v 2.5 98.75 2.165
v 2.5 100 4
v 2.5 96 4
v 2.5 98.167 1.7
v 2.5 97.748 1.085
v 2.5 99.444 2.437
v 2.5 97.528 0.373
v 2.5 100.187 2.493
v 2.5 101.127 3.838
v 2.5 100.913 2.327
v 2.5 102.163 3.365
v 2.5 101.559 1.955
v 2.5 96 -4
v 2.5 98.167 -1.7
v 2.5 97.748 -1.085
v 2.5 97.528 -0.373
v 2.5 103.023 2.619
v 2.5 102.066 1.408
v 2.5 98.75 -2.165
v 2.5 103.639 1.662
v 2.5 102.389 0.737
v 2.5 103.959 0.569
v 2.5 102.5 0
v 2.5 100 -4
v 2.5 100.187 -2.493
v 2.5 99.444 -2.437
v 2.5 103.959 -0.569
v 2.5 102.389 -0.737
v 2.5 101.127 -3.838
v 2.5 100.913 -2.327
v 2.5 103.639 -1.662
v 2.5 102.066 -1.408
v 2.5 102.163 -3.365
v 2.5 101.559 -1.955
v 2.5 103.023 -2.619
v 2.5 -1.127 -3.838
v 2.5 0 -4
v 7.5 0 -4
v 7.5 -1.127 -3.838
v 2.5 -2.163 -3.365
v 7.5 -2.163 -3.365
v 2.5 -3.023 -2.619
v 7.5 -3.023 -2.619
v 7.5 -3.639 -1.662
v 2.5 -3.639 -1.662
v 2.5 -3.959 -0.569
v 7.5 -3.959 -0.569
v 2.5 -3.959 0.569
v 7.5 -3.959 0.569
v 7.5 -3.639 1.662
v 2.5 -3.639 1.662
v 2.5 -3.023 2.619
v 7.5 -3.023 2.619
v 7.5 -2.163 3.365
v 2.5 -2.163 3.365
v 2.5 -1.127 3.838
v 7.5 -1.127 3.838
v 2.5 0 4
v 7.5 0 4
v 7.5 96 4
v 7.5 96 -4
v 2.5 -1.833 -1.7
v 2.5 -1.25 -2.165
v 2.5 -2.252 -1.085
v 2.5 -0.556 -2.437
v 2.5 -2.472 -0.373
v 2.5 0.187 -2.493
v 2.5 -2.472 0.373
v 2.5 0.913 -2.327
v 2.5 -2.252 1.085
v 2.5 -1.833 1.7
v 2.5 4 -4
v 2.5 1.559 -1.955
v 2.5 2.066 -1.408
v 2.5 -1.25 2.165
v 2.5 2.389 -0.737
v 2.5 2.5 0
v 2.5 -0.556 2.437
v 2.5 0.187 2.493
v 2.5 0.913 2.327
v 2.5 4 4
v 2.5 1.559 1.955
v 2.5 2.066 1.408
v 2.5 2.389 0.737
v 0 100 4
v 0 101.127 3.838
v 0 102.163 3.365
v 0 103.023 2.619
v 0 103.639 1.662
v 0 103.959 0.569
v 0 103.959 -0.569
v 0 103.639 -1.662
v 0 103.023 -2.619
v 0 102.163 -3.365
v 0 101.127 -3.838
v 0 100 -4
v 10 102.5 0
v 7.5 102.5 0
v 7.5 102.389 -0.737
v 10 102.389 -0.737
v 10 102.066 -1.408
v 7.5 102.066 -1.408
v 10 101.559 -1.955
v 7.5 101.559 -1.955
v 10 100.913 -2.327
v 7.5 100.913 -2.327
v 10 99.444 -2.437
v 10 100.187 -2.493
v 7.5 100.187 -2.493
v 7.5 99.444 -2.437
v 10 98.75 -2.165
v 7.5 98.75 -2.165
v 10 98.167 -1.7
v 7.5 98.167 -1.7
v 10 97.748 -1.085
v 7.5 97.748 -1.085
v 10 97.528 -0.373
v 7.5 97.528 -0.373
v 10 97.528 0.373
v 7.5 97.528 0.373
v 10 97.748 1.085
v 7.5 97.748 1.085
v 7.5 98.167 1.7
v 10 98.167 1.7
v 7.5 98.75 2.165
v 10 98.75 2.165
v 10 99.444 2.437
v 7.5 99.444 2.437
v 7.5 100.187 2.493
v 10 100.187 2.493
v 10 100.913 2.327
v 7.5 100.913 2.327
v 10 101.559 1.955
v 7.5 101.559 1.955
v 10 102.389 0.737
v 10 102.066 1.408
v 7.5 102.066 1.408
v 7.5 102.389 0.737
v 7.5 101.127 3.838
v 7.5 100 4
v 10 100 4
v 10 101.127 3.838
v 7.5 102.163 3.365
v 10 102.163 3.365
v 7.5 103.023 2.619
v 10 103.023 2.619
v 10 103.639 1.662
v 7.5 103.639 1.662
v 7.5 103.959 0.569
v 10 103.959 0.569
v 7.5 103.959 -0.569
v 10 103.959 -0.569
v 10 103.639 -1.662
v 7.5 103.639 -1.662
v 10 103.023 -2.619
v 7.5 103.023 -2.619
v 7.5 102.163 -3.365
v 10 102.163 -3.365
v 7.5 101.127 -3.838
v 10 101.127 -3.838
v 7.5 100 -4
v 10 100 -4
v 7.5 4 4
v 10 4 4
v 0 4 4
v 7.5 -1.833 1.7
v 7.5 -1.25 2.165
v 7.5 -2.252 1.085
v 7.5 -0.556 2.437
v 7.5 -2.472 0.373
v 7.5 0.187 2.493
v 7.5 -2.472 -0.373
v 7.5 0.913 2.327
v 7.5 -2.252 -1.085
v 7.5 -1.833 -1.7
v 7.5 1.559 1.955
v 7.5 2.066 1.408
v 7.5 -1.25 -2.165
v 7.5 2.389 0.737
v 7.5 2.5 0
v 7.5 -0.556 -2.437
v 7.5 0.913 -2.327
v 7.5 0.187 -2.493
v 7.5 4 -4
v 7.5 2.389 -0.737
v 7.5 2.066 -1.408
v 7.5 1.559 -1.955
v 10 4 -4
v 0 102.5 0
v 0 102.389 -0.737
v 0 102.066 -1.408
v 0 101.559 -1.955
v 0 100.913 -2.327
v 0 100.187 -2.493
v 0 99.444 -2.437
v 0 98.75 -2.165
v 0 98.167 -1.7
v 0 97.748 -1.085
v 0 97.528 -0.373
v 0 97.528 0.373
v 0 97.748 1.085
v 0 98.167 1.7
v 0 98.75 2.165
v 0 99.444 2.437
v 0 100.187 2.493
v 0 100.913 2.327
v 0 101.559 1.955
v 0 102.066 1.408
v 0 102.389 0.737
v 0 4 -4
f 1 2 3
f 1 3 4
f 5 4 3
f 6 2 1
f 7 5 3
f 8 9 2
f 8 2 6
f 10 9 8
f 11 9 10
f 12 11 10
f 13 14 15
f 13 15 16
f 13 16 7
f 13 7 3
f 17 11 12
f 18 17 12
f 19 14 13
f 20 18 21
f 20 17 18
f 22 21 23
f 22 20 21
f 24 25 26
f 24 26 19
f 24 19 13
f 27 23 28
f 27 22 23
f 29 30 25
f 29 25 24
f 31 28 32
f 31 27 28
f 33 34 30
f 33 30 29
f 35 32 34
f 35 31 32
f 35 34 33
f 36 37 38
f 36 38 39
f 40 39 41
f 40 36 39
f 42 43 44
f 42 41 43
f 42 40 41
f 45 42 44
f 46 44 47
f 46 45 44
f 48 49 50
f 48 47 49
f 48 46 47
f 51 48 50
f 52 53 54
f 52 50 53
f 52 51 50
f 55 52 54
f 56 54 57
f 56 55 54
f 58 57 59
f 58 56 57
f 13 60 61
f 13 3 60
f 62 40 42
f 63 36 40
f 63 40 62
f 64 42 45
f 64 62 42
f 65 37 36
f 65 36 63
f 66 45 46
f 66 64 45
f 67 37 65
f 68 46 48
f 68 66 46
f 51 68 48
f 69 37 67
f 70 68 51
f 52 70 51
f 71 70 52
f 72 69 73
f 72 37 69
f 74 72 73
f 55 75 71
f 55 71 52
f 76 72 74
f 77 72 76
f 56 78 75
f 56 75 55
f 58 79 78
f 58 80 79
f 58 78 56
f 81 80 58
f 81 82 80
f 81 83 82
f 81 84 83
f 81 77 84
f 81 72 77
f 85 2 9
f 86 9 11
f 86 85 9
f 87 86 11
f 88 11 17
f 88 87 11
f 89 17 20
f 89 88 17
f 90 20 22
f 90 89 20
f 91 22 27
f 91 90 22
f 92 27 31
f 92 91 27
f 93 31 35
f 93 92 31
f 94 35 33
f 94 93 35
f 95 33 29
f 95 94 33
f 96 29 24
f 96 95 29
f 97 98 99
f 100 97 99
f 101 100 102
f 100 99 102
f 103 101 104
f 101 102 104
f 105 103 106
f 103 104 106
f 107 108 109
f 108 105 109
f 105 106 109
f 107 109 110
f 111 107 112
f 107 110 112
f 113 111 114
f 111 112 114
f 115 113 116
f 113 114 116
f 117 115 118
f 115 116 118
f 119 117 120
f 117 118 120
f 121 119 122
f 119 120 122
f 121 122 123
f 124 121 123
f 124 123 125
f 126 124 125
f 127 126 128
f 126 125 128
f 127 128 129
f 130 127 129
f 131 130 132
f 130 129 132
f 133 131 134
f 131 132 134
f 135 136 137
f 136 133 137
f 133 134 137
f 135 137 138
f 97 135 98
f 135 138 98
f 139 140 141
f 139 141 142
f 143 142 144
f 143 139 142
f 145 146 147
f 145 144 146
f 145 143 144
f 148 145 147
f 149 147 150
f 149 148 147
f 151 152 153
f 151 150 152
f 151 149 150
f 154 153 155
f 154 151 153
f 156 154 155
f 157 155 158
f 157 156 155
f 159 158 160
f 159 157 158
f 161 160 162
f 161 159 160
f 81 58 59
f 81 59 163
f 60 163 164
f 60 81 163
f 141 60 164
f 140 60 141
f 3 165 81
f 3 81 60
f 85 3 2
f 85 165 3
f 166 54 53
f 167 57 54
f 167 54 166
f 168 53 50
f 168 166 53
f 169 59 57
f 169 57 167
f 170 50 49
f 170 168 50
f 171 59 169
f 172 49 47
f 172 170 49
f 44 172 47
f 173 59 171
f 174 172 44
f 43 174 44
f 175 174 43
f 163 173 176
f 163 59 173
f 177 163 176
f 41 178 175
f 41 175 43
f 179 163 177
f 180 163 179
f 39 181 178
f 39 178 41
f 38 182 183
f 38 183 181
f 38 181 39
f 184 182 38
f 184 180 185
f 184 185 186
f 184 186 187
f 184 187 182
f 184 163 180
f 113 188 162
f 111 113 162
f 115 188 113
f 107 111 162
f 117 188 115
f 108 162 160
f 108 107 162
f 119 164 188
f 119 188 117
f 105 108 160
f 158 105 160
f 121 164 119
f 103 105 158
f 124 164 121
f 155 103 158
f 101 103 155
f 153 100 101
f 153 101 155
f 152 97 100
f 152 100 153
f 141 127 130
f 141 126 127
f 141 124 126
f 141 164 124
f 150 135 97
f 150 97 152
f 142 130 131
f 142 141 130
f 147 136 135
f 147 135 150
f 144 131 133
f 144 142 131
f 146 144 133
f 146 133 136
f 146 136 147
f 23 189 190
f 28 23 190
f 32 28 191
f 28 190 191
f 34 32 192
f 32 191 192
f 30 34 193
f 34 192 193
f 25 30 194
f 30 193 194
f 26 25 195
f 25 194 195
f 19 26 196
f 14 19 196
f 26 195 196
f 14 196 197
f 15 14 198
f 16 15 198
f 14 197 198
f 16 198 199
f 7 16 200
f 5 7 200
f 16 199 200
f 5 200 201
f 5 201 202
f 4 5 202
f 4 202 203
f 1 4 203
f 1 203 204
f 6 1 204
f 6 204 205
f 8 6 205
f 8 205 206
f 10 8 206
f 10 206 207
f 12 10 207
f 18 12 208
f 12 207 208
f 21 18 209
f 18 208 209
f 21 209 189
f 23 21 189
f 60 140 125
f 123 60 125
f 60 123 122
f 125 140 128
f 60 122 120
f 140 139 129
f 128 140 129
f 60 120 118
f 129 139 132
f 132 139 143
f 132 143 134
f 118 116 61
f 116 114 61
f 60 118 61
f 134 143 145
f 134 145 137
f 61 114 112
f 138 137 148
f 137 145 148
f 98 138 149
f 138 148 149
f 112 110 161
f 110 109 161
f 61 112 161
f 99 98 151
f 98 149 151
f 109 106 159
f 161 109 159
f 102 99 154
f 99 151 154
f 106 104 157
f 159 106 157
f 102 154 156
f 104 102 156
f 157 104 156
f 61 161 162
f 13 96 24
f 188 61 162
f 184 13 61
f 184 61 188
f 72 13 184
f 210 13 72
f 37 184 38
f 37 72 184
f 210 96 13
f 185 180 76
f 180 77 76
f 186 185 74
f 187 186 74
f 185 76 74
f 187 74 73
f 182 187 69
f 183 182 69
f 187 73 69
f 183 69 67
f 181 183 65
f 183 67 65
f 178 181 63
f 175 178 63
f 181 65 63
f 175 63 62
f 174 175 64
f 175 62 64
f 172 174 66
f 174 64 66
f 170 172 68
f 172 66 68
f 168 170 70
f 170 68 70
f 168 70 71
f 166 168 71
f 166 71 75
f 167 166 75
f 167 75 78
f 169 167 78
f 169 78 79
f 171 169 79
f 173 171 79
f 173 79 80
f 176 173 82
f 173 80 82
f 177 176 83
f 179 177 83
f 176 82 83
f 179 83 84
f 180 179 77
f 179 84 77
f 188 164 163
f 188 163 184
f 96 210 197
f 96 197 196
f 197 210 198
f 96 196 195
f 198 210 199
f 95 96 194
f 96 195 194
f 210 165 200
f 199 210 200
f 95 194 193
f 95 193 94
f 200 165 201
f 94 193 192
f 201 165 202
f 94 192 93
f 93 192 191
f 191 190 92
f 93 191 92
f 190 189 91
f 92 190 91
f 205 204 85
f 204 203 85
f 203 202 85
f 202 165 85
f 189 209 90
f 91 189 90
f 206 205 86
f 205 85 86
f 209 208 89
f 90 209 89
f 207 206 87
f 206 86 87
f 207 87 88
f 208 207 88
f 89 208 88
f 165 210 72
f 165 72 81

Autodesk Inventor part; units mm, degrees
ref_plane "YZ Plane" through (0, 0, 0) normal (1, 0, 0) x (0, 1, 0)
ref_plane "XZ Plane" through (0, 0, 0) normal (0, 1, 0) x (-1, 0, 0)
ref_plane "XY Plane" through (0, 0, 0) normal (0, 0, 1) x (1, 0, 0)
sketch "Sketch1" plane through (0, 0, 0) normal (1, 0, 0) x (0, 1, 0)
  circle A0 centre (0, 0) radius 2.5
  arc A1 (0, 4) -> (0, -4) centre (0, 0) ccw
  line L0 (0, 4) -> (100, 4)
  line L1 (100, -4) -> (0, -4)
  arc A2 (100, -4) -> (100, 4) centre (100, 0) ccw
  circle A3 centre (100, 0) radius 2.5
  dimension "d0" = 5
  dimension "d1" = 8
  dimension "d3" = 100
  dimension "d4" = 8
  dimension "d5" = 5
extrude "Extrusion1" add sketch "Sketch1" along normal blind 10
ref_plane "Work Plane1" through (5, 0, 0) normal (1, 0, 0) x (0, 0, -1)
sketch "Sketch2" plane through (5, 0, 0) normal (1, 0, 0) x (0, 0, -1)
  circle A0 centre (0, 100) radius 2.5 projected
  arc A1 (4, 100) -> (-4, 100) centre (0, 100) ccw projected
  line L0 (0, 104) -> (5, 104)
  line L1 (5, 104) -> (-5, 104)
  line L2 (-5, 104) -> (-5, 96)
  line L3 (-5, 96) -> (5, 96)
  line L4 (5, 96) -> (5, 104)
  point P0 (0, 0)
  dimension "d9" = 5
  dimension "d10" = 10
  dimension "d11" = 8
extrude "Extrusion2" cut sketch "Sketch2" along normal mid plane 5
sketch "Sketch4" plane through (10, 0, 0) normal (1, 0, 0) x (0, 0, -1)
  line L0 (5, -4) -> (-5, -4)
  line L1 (-5, -4) -> (-5, 4)
  line L2 (-5, 4) -> (5, 4)
  line L3 (5, 4) -> (5, -4)
  point P0 (0, 0)
  dimension "d19" = 10
  dimension "d20" = 8
extrude "Extrusion4" cut sketch "Sketch4" against normal blind 2.5
sketch "Sketch5" plane through (0, 0, 0) normal (-1, 0, 0) x (0, 0, 1)
  line L0 (5, -4) -> (-5, -4)
  line L1 (-5, -4) -> (-5, 4)
  line L2 (-5, 4) -> (5, 4)
  line L3 (5, 4) -> (5, -4)
  point P0 (0, 0)
  dimension "d23" = 10
  dimension "d24" = 8
extrude "Extrusion5" cut sketch "Sketch5" against normal blind 2.5
equation "\"d5\" = d0"
properties part number "ServoLinkage"
